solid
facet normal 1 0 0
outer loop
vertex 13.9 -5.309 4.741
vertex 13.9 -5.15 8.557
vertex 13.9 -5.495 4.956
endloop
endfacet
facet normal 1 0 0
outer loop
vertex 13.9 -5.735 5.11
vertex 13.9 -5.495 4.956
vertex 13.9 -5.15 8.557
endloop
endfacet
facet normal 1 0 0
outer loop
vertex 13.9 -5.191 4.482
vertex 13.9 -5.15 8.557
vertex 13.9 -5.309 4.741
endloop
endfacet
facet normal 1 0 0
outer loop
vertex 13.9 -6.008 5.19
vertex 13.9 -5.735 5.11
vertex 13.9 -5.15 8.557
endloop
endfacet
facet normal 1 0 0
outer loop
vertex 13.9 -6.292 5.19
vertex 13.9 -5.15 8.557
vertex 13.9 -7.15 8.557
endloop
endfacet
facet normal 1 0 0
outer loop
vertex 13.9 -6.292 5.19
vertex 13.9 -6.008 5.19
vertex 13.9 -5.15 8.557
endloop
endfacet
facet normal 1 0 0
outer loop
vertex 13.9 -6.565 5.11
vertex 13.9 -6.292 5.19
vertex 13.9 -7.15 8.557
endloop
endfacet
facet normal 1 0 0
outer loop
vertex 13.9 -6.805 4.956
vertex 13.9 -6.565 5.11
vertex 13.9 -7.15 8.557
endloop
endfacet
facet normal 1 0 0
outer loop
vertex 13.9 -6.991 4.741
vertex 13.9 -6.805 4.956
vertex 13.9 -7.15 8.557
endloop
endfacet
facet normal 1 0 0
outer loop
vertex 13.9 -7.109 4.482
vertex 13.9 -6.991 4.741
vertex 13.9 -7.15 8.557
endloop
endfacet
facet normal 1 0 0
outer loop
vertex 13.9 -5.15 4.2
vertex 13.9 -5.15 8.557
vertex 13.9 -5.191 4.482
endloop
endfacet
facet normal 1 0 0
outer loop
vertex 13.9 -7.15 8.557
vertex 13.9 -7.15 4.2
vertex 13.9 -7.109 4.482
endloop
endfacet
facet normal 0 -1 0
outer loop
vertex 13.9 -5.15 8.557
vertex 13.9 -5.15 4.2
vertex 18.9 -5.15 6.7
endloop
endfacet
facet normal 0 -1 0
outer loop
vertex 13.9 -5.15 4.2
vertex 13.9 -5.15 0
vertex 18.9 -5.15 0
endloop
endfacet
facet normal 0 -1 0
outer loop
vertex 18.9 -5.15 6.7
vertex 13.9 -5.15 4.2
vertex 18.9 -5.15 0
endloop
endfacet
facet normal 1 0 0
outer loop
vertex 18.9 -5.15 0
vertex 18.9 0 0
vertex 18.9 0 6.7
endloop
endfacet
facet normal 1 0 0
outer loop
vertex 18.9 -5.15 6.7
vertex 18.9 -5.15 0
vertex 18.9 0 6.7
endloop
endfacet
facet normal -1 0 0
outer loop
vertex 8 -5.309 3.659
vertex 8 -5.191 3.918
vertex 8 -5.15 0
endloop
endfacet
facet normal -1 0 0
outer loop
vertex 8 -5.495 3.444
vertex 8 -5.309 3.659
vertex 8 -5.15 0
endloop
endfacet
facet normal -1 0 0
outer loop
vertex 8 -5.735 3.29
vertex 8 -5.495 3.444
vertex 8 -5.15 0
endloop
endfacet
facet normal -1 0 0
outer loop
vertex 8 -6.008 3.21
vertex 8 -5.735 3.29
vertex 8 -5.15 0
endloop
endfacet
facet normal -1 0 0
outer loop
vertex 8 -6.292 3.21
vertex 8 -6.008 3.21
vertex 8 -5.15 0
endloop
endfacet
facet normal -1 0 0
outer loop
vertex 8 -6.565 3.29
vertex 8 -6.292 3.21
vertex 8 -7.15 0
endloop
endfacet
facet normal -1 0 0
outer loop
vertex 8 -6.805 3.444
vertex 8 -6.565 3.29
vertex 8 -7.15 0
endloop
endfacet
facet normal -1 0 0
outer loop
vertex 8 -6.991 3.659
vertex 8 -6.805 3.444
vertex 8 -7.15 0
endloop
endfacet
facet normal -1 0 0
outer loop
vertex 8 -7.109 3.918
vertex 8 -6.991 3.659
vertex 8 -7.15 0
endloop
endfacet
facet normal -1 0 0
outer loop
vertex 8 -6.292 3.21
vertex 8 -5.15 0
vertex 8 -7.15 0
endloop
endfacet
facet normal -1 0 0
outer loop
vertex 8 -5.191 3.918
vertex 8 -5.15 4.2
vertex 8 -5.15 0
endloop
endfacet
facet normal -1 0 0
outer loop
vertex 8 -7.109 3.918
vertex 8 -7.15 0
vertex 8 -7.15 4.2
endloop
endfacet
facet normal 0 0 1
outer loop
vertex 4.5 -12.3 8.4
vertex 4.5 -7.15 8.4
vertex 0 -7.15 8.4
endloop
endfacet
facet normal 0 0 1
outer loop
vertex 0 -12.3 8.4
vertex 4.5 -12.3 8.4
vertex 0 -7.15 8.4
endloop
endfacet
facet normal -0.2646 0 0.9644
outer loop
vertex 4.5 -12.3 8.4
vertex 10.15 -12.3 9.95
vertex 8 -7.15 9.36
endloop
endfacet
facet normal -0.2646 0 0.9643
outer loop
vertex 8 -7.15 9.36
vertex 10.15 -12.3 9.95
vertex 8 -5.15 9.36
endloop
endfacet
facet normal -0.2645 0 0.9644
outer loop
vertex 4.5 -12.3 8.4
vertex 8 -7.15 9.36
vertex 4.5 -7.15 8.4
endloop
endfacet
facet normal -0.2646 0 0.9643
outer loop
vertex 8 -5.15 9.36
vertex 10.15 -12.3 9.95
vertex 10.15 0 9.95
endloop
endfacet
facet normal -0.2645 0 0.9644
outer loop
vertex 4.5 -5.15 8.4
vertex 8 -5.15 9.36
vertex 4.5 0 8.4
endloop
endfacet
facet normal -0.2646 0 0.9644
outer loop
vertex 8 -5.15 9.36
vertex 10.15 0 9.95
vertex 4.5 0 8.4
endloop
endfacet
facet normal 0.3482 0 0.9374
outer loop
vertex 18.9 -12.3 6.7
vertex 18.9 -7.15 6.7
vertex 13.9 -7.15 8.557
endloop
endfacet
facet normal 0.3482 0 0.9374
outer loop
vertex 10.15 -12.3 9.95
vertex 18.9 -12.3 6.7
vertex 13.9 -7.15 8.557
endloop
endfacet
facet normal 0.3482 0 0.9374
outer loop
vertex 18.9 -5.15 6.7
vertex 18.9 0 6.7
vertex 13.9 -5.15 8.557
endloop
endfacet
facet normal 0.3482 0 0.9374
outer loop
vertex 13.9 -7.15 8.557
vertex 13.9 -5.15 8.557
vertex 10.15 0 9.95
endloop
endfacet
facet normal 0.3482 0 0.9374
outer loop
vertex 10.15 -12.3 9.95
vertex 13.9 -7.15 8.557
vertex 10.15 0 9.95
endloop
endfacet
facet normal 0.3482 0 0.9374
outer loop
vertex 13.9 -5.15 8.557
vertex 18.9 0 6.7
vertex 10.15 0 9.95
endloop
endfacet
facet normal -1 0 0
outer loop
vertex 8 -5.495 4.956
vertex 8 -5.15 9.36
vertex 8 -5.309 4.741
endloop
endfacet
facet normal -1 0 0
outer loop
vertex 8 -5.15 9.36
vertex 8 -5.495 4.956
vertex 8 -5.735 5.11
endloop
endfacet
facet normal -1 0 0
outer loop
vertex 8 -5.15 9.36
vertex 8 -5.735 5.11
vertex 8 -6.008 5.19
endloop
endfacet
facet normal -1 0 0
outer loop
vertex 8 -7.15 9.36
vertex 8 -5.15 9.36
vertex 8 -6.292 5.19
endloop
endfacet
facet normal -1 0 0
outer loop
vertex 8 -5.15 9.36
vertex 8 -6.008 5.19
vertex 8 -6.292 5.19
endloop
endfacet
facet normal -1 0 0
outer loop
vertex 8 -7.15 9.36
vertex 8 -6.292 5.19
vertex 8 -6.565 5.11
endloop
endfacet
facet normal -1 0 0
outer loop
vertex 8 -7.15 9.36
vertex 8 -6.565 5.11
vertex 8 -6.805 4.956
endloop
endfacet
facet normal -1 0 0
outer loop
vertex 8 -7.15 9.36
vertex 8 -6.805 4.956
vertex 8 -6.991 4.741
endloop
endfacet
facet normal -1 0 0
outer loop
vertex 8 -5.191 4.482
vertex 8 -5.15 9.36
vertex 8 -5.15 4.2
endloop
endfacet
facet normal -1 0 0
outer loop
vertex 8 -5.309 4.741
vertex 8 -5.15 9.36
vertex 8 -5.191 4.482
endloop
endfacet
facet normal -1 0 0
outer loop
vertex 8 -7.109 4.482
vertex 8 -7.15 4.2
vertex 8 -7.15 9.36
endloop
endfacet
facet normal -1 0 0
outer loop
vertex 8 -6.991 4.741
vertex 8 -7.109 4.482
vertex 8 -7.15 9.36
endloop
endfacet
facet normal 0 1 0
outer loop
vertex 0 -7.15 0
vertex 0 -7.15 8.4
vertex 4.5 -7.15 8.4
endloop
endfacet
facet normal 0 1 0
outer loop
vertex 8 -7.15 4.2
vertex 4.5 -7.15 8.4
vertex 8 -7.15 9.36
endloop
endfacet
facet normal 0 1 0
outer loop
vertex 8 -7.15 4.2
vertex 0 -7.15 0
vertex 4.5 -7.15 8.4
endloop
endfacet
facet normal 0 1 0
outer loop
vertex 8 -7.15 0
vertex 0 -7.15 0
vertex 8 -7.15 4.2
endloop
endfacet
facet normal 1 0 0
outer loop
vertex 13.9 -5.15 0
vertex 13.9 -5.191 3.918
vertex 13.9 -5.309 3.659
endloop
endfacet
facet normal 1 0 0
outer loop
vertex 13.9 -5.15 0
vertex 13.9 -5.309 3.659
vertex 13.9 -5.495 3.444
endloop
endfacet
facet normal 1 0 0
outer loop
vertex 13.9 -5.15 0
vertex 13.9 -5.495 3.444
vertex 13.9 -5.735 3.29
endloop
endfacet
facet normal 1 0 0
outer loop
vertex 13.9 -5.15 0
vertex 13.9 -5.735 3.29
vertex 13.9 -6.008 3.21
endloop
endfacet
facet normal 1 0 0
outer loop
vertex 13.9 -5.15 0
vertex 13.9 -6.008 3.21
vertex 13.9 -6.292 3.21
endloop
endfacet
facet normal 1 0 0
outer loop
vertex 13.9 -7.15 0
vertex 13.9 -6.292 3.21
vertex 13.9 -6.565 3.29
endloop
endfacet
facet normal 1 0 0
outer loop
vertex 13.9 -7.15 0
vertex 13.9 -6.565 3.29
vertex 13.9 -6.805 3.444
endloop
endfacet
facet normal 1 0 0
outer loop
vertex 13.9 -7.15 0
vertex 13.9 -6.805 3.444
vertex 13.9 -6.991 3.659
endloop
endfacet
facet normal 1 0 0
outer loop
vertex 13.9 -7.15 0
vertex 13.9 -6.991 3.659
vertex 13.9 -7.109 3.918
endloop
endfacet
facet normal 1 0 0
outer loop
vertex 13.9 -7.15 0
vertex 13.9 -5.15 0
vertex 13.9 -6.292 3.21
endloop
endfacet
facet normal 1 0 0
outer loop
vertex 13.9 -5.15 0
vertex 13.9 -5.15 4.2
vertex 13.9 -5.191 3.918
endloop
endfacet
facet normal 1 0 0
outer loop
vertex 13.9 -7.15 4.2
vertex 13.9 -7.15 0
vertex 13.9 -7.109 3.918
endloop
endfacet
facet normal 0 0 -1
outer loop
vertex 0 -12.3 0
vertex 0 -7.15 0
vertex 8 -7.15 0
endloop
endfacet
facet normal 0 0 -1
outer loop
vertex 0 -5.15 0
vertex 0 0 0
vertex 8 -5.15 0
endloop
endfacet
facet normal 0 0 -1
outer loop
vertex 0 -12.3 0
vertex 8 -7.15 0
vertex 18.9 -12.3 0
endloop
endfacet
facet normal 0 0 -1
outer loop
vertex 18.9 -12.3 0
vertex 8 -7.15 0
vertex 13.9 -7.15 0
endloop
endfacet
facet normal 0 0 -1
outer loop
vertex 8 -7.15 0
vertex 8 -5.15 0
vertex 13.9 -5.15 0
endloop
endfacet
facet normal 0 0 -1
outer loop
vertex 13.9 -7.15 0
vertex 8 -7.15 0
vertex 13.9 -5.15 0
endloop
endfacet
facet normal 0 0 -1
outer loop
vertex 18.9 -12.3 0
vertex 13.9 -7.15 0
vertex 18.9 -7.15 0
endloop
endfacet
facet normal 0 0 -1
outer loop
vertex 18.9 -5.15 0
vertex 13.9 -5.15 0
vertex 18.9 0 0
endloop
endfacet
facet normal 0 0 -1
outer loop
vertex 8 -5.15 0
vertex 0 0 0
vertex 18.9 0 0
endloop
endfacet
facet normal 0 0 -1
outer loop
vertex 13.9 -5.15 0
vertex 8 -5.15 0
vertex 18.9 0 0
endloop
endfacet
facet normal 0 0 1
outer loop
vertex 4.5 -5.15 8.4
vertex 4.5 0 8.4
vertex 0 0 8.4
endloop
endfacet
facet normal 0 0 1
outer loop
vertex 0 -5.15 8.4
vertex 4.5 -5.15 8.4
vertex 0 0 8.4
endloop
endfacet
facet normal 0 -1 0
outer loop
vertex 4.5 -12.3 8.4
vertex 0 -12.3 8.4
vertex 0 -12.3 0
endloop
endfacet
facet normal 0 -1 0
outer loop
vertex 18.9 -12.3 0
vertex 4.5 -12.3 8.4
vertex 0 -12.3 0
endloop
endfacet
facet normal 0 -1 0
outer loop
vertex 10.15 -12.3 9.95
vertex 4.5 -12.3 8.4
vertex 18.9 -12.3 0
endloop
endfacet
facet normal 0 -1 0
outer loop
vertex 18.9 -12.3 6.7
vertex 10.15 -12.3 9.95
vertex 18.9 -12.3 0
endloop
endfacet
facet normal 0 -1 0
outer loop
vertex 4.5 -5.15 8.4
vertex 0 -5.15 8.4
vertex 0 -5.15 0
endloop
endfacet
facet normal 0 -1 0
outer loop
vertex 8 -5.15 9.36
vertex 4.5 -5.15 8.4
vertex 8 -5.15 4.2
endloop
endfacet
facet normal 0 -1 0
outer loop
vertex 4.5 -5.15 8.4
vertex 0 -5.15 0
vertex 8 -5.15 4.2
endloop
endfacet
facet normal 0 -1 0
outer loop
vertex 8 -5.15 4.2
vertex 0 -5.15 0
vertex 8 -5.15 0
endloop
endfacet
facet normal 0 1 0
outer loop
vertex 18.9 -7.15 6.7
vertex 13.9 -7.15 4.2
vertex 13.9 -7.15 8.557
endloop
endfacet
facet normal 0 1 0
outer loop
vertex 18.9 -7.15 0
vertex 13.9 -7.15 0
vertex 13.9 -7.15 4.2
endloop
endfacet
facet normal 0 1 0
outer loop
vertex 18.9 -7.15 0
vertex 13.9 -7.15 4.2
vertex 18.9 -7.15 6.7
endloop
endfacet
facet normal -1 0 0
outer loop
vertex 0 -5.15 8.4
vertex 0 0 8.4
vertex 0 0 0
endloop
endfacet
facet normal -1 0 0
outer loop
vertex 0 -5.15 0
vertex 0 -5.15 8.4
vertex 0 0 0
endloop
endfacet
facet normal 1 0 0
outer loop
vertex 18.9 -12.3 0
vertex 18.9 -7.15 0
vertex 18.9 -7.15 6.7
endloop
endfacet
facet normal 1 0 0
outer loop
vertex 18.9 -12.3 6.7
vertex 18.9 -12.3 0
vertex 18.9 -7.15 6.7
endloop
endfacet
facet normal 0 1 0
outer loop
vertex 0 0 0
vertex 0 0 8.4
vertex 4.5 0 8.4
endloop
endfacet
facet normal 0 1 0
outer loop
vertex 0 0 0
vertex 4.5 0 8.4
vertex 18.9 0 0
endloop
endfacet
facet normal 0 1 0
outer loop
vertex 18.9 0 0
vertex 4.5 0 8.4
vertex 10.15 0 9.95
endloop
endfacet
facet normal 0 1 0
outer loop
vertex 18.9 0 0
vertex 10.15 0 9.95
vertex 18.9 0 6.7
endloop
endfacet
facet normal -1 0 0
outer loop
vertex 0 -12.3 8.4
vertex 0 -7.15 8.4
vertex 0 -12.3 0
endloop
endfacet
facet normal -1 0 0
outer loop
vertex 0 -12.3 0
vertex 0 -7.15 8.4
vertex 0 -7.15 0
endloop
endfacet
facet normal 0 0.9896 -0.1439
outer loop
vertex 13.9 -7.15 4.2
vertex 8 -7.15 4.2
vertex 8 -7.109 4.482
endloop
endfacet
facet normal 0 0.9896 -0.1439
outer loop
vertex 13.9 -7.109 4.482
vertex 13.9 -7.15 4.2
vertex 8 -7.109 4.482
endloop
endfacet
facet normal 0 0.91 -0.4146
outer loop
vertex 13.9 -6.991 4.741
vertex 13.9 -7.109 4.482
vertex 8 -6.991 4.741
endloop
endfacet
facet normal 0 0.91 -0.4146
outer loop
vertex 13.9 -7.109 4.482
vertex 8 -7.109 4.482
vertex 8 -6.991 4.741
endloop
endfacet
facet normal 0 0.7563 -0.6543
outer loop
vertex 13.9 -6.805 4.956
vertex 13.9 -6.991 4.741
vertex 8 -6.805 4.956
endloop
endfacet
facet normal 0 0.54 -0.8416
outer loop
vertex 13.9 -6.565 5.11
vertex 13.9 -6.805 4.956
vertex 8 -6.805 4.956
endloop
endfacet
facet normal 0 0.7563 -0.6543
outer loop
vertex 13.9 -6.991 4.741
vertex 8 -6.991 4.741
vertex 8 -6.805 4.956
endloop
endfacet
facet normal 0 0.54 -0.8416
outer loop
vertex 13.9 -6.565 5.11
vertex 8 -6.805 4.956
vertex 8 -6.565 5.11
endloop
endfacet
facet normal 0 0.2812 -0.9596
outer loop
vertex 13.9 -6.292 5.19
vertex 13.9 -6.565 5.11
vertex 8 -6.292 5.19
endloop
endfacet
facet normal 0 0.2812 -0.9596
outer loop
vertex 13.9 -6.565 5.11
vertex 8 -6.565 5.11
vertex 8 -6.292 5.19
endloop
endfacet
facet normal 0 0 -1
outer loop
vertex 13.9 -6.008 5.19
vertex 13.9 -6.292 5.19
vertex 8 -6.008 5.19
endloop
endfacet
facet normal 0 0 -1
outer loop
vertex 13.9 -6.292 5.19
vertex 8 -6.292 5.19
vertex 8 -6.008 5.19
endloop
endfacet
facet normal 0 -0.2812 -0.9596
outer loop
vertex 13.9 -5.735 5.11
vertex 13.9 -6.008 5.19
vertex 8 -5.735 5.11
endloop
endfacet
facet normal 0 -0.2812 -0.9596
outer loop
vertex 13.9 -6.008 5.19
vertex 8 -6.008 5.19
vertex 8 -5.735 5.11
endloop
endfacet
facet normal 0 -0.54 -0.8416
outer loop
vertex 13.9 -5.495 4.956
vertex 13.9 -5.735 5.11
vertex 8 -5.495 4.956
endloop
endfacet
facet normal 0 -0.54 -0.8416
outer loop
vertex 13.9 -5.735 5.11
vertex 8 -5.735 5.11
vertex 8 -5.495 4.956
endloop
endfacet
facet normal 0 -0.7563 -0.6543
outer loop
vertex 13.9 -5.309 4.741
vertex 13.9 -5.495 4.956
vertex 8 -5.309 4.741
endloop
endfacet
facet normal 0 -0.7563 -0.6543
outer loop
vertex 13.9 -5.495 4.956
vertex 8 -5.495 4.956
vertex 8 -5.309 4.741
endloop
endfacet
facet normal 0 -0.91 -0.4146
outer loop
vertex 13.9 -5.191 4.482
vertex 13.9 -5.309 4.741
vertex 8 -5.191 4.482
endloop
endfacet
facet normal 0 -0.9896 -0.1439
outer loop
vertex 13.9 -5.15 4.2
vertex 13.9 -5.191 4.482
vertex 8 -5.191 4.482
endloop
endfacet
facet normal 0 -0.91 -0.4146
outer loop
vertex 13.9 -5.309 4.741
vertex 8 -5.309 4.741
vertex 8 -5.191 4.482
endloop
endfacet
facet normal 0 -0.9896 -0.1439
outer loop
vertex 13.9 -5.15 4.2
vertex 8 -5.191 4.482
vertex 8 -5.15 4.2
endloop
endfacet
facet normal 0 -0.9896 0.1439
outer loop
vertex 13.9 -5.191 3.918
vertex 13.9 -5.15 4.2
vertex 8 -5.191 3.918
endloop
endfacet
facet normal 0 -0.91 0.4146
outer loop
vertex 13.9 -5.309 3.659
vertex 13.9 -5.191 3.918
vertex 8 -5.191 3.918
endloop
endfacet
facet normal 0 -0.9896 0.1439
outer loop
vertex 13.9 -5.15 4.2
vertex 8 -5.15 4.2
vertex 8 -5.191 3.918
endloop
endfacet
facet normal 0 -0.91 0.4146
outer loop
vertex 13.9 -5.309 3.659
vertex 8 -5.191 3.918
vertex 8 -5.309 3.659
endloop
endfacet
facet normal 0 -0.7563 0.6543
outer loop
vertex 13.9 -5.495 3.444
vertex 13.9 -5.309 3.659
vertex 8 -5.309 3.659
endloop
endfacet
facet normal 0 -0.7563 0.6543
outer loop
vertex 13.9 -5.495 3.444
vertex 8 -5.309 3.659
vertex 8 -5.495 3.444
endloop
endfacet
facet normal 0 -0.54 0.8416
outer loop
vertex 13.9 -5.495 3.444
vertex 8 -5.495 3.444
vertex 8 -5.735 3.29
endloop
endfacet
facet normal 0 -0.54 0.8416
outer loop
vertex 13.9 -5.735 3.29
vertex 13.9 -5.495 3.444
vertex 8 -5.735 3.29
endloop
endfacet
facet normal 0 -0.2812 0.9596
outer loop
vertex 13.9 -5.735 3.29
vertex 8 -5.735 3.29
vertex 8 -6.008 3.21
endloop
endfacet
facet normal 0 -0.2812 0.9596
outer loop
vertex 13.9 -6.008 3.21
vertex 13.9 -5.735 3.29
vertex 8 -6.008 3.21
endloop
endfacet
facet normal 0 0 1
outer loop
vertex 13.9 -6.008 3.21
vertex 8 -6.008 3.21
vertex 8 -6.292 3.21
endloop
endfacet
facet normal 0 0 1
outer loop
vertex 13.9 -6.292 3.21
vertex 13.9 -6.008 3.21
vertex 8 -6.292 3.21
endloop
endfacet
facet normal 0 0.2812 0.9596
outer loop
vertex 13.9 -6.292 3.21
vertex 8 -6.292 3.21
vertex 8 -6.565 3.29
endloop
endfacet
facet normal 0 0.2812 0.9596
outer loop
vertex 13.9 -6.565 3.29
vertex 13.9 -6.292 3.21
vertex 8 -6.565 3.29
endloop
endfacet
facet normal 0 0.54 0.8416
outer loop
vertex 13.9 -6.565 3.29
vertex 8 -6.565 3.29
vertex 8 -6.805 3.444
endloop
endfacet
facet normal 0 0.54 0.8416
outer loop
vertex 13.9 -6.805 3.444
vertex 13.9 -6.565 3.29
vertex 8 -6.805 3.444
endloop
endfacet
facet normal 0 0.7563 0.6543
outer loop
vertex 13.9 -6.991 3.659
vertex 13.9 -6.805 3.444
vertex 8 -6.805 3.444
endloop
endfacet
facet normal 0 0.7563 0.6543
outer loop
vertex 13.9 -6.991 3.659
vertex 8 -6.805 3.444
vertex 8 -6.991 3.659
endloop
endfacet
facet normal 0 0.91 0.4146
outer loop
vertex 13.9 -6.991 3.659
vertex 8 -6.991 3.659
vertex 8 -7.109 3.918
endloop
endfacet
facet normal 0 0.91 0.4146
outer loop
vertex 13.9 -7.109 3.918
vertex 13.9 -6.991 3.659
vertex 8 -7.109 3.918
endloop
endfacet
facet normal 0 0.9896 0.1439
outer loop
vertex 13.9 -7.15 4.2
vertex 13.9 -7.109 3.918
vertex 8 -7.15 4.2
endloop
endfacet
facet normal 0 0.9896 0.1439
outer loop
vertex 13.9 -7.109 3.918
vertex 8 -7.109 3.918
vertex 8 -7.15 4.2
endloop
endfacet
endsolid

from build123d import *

# Parameters (mm, degrees)
F1_DEPTH = 12.3
F2_W     = 8
F2_H     = 2
F2_W_2   = 5
F3_DEPTH = 9.951001
F5_DEPTH = 10.901


with BuildPart() as f1:
    # F0 (on Front) → F1 (new body)
    with BuildSketch(Plane.XZ):
        Polygon((4.5, 8.4), (0, 8.4), (0, 0), (18.9, 0), (18.9, 6.7), (10.149998, 9.950001), align=None)
    extrude(amount=F1_DEPTH)

    # F2 (on face) → F3 (cut, through all)
    with BuildSketch(Plane(origin=(0, 0, 0), x_dir=(1, 0, 0), z_dir=(0, 0, -1))):
        with Locations((4, 6.15)):
            Rectangle(F2_W, F2_H)
        with Locations((16.4, 6.15)):
            Rectangle(F2_W_2, F2_H)
    extrude(amount=-F3_DEPTH, mode=Mode.SUBTRACT)

    # F4 (on face) → F5 (cut, through all)
    with BuildSketch(Plane(origin=(8, 0, 0), x_dir=(0, -1, 0), z_dir=(-1, 0, 0))):
        with BuildLine():
            ThreePointArc((5.15, 4.2), (6.15, 3.2), (7.15, 4.2))
            ThreePointArc((7.15, 4.2), (6.15, 5.2), (5.15, 4.2))
        make_face()
    extrude(amount=-F5_DEPTH, mode=Mode.SUBTRACT)


solid = f1.part
